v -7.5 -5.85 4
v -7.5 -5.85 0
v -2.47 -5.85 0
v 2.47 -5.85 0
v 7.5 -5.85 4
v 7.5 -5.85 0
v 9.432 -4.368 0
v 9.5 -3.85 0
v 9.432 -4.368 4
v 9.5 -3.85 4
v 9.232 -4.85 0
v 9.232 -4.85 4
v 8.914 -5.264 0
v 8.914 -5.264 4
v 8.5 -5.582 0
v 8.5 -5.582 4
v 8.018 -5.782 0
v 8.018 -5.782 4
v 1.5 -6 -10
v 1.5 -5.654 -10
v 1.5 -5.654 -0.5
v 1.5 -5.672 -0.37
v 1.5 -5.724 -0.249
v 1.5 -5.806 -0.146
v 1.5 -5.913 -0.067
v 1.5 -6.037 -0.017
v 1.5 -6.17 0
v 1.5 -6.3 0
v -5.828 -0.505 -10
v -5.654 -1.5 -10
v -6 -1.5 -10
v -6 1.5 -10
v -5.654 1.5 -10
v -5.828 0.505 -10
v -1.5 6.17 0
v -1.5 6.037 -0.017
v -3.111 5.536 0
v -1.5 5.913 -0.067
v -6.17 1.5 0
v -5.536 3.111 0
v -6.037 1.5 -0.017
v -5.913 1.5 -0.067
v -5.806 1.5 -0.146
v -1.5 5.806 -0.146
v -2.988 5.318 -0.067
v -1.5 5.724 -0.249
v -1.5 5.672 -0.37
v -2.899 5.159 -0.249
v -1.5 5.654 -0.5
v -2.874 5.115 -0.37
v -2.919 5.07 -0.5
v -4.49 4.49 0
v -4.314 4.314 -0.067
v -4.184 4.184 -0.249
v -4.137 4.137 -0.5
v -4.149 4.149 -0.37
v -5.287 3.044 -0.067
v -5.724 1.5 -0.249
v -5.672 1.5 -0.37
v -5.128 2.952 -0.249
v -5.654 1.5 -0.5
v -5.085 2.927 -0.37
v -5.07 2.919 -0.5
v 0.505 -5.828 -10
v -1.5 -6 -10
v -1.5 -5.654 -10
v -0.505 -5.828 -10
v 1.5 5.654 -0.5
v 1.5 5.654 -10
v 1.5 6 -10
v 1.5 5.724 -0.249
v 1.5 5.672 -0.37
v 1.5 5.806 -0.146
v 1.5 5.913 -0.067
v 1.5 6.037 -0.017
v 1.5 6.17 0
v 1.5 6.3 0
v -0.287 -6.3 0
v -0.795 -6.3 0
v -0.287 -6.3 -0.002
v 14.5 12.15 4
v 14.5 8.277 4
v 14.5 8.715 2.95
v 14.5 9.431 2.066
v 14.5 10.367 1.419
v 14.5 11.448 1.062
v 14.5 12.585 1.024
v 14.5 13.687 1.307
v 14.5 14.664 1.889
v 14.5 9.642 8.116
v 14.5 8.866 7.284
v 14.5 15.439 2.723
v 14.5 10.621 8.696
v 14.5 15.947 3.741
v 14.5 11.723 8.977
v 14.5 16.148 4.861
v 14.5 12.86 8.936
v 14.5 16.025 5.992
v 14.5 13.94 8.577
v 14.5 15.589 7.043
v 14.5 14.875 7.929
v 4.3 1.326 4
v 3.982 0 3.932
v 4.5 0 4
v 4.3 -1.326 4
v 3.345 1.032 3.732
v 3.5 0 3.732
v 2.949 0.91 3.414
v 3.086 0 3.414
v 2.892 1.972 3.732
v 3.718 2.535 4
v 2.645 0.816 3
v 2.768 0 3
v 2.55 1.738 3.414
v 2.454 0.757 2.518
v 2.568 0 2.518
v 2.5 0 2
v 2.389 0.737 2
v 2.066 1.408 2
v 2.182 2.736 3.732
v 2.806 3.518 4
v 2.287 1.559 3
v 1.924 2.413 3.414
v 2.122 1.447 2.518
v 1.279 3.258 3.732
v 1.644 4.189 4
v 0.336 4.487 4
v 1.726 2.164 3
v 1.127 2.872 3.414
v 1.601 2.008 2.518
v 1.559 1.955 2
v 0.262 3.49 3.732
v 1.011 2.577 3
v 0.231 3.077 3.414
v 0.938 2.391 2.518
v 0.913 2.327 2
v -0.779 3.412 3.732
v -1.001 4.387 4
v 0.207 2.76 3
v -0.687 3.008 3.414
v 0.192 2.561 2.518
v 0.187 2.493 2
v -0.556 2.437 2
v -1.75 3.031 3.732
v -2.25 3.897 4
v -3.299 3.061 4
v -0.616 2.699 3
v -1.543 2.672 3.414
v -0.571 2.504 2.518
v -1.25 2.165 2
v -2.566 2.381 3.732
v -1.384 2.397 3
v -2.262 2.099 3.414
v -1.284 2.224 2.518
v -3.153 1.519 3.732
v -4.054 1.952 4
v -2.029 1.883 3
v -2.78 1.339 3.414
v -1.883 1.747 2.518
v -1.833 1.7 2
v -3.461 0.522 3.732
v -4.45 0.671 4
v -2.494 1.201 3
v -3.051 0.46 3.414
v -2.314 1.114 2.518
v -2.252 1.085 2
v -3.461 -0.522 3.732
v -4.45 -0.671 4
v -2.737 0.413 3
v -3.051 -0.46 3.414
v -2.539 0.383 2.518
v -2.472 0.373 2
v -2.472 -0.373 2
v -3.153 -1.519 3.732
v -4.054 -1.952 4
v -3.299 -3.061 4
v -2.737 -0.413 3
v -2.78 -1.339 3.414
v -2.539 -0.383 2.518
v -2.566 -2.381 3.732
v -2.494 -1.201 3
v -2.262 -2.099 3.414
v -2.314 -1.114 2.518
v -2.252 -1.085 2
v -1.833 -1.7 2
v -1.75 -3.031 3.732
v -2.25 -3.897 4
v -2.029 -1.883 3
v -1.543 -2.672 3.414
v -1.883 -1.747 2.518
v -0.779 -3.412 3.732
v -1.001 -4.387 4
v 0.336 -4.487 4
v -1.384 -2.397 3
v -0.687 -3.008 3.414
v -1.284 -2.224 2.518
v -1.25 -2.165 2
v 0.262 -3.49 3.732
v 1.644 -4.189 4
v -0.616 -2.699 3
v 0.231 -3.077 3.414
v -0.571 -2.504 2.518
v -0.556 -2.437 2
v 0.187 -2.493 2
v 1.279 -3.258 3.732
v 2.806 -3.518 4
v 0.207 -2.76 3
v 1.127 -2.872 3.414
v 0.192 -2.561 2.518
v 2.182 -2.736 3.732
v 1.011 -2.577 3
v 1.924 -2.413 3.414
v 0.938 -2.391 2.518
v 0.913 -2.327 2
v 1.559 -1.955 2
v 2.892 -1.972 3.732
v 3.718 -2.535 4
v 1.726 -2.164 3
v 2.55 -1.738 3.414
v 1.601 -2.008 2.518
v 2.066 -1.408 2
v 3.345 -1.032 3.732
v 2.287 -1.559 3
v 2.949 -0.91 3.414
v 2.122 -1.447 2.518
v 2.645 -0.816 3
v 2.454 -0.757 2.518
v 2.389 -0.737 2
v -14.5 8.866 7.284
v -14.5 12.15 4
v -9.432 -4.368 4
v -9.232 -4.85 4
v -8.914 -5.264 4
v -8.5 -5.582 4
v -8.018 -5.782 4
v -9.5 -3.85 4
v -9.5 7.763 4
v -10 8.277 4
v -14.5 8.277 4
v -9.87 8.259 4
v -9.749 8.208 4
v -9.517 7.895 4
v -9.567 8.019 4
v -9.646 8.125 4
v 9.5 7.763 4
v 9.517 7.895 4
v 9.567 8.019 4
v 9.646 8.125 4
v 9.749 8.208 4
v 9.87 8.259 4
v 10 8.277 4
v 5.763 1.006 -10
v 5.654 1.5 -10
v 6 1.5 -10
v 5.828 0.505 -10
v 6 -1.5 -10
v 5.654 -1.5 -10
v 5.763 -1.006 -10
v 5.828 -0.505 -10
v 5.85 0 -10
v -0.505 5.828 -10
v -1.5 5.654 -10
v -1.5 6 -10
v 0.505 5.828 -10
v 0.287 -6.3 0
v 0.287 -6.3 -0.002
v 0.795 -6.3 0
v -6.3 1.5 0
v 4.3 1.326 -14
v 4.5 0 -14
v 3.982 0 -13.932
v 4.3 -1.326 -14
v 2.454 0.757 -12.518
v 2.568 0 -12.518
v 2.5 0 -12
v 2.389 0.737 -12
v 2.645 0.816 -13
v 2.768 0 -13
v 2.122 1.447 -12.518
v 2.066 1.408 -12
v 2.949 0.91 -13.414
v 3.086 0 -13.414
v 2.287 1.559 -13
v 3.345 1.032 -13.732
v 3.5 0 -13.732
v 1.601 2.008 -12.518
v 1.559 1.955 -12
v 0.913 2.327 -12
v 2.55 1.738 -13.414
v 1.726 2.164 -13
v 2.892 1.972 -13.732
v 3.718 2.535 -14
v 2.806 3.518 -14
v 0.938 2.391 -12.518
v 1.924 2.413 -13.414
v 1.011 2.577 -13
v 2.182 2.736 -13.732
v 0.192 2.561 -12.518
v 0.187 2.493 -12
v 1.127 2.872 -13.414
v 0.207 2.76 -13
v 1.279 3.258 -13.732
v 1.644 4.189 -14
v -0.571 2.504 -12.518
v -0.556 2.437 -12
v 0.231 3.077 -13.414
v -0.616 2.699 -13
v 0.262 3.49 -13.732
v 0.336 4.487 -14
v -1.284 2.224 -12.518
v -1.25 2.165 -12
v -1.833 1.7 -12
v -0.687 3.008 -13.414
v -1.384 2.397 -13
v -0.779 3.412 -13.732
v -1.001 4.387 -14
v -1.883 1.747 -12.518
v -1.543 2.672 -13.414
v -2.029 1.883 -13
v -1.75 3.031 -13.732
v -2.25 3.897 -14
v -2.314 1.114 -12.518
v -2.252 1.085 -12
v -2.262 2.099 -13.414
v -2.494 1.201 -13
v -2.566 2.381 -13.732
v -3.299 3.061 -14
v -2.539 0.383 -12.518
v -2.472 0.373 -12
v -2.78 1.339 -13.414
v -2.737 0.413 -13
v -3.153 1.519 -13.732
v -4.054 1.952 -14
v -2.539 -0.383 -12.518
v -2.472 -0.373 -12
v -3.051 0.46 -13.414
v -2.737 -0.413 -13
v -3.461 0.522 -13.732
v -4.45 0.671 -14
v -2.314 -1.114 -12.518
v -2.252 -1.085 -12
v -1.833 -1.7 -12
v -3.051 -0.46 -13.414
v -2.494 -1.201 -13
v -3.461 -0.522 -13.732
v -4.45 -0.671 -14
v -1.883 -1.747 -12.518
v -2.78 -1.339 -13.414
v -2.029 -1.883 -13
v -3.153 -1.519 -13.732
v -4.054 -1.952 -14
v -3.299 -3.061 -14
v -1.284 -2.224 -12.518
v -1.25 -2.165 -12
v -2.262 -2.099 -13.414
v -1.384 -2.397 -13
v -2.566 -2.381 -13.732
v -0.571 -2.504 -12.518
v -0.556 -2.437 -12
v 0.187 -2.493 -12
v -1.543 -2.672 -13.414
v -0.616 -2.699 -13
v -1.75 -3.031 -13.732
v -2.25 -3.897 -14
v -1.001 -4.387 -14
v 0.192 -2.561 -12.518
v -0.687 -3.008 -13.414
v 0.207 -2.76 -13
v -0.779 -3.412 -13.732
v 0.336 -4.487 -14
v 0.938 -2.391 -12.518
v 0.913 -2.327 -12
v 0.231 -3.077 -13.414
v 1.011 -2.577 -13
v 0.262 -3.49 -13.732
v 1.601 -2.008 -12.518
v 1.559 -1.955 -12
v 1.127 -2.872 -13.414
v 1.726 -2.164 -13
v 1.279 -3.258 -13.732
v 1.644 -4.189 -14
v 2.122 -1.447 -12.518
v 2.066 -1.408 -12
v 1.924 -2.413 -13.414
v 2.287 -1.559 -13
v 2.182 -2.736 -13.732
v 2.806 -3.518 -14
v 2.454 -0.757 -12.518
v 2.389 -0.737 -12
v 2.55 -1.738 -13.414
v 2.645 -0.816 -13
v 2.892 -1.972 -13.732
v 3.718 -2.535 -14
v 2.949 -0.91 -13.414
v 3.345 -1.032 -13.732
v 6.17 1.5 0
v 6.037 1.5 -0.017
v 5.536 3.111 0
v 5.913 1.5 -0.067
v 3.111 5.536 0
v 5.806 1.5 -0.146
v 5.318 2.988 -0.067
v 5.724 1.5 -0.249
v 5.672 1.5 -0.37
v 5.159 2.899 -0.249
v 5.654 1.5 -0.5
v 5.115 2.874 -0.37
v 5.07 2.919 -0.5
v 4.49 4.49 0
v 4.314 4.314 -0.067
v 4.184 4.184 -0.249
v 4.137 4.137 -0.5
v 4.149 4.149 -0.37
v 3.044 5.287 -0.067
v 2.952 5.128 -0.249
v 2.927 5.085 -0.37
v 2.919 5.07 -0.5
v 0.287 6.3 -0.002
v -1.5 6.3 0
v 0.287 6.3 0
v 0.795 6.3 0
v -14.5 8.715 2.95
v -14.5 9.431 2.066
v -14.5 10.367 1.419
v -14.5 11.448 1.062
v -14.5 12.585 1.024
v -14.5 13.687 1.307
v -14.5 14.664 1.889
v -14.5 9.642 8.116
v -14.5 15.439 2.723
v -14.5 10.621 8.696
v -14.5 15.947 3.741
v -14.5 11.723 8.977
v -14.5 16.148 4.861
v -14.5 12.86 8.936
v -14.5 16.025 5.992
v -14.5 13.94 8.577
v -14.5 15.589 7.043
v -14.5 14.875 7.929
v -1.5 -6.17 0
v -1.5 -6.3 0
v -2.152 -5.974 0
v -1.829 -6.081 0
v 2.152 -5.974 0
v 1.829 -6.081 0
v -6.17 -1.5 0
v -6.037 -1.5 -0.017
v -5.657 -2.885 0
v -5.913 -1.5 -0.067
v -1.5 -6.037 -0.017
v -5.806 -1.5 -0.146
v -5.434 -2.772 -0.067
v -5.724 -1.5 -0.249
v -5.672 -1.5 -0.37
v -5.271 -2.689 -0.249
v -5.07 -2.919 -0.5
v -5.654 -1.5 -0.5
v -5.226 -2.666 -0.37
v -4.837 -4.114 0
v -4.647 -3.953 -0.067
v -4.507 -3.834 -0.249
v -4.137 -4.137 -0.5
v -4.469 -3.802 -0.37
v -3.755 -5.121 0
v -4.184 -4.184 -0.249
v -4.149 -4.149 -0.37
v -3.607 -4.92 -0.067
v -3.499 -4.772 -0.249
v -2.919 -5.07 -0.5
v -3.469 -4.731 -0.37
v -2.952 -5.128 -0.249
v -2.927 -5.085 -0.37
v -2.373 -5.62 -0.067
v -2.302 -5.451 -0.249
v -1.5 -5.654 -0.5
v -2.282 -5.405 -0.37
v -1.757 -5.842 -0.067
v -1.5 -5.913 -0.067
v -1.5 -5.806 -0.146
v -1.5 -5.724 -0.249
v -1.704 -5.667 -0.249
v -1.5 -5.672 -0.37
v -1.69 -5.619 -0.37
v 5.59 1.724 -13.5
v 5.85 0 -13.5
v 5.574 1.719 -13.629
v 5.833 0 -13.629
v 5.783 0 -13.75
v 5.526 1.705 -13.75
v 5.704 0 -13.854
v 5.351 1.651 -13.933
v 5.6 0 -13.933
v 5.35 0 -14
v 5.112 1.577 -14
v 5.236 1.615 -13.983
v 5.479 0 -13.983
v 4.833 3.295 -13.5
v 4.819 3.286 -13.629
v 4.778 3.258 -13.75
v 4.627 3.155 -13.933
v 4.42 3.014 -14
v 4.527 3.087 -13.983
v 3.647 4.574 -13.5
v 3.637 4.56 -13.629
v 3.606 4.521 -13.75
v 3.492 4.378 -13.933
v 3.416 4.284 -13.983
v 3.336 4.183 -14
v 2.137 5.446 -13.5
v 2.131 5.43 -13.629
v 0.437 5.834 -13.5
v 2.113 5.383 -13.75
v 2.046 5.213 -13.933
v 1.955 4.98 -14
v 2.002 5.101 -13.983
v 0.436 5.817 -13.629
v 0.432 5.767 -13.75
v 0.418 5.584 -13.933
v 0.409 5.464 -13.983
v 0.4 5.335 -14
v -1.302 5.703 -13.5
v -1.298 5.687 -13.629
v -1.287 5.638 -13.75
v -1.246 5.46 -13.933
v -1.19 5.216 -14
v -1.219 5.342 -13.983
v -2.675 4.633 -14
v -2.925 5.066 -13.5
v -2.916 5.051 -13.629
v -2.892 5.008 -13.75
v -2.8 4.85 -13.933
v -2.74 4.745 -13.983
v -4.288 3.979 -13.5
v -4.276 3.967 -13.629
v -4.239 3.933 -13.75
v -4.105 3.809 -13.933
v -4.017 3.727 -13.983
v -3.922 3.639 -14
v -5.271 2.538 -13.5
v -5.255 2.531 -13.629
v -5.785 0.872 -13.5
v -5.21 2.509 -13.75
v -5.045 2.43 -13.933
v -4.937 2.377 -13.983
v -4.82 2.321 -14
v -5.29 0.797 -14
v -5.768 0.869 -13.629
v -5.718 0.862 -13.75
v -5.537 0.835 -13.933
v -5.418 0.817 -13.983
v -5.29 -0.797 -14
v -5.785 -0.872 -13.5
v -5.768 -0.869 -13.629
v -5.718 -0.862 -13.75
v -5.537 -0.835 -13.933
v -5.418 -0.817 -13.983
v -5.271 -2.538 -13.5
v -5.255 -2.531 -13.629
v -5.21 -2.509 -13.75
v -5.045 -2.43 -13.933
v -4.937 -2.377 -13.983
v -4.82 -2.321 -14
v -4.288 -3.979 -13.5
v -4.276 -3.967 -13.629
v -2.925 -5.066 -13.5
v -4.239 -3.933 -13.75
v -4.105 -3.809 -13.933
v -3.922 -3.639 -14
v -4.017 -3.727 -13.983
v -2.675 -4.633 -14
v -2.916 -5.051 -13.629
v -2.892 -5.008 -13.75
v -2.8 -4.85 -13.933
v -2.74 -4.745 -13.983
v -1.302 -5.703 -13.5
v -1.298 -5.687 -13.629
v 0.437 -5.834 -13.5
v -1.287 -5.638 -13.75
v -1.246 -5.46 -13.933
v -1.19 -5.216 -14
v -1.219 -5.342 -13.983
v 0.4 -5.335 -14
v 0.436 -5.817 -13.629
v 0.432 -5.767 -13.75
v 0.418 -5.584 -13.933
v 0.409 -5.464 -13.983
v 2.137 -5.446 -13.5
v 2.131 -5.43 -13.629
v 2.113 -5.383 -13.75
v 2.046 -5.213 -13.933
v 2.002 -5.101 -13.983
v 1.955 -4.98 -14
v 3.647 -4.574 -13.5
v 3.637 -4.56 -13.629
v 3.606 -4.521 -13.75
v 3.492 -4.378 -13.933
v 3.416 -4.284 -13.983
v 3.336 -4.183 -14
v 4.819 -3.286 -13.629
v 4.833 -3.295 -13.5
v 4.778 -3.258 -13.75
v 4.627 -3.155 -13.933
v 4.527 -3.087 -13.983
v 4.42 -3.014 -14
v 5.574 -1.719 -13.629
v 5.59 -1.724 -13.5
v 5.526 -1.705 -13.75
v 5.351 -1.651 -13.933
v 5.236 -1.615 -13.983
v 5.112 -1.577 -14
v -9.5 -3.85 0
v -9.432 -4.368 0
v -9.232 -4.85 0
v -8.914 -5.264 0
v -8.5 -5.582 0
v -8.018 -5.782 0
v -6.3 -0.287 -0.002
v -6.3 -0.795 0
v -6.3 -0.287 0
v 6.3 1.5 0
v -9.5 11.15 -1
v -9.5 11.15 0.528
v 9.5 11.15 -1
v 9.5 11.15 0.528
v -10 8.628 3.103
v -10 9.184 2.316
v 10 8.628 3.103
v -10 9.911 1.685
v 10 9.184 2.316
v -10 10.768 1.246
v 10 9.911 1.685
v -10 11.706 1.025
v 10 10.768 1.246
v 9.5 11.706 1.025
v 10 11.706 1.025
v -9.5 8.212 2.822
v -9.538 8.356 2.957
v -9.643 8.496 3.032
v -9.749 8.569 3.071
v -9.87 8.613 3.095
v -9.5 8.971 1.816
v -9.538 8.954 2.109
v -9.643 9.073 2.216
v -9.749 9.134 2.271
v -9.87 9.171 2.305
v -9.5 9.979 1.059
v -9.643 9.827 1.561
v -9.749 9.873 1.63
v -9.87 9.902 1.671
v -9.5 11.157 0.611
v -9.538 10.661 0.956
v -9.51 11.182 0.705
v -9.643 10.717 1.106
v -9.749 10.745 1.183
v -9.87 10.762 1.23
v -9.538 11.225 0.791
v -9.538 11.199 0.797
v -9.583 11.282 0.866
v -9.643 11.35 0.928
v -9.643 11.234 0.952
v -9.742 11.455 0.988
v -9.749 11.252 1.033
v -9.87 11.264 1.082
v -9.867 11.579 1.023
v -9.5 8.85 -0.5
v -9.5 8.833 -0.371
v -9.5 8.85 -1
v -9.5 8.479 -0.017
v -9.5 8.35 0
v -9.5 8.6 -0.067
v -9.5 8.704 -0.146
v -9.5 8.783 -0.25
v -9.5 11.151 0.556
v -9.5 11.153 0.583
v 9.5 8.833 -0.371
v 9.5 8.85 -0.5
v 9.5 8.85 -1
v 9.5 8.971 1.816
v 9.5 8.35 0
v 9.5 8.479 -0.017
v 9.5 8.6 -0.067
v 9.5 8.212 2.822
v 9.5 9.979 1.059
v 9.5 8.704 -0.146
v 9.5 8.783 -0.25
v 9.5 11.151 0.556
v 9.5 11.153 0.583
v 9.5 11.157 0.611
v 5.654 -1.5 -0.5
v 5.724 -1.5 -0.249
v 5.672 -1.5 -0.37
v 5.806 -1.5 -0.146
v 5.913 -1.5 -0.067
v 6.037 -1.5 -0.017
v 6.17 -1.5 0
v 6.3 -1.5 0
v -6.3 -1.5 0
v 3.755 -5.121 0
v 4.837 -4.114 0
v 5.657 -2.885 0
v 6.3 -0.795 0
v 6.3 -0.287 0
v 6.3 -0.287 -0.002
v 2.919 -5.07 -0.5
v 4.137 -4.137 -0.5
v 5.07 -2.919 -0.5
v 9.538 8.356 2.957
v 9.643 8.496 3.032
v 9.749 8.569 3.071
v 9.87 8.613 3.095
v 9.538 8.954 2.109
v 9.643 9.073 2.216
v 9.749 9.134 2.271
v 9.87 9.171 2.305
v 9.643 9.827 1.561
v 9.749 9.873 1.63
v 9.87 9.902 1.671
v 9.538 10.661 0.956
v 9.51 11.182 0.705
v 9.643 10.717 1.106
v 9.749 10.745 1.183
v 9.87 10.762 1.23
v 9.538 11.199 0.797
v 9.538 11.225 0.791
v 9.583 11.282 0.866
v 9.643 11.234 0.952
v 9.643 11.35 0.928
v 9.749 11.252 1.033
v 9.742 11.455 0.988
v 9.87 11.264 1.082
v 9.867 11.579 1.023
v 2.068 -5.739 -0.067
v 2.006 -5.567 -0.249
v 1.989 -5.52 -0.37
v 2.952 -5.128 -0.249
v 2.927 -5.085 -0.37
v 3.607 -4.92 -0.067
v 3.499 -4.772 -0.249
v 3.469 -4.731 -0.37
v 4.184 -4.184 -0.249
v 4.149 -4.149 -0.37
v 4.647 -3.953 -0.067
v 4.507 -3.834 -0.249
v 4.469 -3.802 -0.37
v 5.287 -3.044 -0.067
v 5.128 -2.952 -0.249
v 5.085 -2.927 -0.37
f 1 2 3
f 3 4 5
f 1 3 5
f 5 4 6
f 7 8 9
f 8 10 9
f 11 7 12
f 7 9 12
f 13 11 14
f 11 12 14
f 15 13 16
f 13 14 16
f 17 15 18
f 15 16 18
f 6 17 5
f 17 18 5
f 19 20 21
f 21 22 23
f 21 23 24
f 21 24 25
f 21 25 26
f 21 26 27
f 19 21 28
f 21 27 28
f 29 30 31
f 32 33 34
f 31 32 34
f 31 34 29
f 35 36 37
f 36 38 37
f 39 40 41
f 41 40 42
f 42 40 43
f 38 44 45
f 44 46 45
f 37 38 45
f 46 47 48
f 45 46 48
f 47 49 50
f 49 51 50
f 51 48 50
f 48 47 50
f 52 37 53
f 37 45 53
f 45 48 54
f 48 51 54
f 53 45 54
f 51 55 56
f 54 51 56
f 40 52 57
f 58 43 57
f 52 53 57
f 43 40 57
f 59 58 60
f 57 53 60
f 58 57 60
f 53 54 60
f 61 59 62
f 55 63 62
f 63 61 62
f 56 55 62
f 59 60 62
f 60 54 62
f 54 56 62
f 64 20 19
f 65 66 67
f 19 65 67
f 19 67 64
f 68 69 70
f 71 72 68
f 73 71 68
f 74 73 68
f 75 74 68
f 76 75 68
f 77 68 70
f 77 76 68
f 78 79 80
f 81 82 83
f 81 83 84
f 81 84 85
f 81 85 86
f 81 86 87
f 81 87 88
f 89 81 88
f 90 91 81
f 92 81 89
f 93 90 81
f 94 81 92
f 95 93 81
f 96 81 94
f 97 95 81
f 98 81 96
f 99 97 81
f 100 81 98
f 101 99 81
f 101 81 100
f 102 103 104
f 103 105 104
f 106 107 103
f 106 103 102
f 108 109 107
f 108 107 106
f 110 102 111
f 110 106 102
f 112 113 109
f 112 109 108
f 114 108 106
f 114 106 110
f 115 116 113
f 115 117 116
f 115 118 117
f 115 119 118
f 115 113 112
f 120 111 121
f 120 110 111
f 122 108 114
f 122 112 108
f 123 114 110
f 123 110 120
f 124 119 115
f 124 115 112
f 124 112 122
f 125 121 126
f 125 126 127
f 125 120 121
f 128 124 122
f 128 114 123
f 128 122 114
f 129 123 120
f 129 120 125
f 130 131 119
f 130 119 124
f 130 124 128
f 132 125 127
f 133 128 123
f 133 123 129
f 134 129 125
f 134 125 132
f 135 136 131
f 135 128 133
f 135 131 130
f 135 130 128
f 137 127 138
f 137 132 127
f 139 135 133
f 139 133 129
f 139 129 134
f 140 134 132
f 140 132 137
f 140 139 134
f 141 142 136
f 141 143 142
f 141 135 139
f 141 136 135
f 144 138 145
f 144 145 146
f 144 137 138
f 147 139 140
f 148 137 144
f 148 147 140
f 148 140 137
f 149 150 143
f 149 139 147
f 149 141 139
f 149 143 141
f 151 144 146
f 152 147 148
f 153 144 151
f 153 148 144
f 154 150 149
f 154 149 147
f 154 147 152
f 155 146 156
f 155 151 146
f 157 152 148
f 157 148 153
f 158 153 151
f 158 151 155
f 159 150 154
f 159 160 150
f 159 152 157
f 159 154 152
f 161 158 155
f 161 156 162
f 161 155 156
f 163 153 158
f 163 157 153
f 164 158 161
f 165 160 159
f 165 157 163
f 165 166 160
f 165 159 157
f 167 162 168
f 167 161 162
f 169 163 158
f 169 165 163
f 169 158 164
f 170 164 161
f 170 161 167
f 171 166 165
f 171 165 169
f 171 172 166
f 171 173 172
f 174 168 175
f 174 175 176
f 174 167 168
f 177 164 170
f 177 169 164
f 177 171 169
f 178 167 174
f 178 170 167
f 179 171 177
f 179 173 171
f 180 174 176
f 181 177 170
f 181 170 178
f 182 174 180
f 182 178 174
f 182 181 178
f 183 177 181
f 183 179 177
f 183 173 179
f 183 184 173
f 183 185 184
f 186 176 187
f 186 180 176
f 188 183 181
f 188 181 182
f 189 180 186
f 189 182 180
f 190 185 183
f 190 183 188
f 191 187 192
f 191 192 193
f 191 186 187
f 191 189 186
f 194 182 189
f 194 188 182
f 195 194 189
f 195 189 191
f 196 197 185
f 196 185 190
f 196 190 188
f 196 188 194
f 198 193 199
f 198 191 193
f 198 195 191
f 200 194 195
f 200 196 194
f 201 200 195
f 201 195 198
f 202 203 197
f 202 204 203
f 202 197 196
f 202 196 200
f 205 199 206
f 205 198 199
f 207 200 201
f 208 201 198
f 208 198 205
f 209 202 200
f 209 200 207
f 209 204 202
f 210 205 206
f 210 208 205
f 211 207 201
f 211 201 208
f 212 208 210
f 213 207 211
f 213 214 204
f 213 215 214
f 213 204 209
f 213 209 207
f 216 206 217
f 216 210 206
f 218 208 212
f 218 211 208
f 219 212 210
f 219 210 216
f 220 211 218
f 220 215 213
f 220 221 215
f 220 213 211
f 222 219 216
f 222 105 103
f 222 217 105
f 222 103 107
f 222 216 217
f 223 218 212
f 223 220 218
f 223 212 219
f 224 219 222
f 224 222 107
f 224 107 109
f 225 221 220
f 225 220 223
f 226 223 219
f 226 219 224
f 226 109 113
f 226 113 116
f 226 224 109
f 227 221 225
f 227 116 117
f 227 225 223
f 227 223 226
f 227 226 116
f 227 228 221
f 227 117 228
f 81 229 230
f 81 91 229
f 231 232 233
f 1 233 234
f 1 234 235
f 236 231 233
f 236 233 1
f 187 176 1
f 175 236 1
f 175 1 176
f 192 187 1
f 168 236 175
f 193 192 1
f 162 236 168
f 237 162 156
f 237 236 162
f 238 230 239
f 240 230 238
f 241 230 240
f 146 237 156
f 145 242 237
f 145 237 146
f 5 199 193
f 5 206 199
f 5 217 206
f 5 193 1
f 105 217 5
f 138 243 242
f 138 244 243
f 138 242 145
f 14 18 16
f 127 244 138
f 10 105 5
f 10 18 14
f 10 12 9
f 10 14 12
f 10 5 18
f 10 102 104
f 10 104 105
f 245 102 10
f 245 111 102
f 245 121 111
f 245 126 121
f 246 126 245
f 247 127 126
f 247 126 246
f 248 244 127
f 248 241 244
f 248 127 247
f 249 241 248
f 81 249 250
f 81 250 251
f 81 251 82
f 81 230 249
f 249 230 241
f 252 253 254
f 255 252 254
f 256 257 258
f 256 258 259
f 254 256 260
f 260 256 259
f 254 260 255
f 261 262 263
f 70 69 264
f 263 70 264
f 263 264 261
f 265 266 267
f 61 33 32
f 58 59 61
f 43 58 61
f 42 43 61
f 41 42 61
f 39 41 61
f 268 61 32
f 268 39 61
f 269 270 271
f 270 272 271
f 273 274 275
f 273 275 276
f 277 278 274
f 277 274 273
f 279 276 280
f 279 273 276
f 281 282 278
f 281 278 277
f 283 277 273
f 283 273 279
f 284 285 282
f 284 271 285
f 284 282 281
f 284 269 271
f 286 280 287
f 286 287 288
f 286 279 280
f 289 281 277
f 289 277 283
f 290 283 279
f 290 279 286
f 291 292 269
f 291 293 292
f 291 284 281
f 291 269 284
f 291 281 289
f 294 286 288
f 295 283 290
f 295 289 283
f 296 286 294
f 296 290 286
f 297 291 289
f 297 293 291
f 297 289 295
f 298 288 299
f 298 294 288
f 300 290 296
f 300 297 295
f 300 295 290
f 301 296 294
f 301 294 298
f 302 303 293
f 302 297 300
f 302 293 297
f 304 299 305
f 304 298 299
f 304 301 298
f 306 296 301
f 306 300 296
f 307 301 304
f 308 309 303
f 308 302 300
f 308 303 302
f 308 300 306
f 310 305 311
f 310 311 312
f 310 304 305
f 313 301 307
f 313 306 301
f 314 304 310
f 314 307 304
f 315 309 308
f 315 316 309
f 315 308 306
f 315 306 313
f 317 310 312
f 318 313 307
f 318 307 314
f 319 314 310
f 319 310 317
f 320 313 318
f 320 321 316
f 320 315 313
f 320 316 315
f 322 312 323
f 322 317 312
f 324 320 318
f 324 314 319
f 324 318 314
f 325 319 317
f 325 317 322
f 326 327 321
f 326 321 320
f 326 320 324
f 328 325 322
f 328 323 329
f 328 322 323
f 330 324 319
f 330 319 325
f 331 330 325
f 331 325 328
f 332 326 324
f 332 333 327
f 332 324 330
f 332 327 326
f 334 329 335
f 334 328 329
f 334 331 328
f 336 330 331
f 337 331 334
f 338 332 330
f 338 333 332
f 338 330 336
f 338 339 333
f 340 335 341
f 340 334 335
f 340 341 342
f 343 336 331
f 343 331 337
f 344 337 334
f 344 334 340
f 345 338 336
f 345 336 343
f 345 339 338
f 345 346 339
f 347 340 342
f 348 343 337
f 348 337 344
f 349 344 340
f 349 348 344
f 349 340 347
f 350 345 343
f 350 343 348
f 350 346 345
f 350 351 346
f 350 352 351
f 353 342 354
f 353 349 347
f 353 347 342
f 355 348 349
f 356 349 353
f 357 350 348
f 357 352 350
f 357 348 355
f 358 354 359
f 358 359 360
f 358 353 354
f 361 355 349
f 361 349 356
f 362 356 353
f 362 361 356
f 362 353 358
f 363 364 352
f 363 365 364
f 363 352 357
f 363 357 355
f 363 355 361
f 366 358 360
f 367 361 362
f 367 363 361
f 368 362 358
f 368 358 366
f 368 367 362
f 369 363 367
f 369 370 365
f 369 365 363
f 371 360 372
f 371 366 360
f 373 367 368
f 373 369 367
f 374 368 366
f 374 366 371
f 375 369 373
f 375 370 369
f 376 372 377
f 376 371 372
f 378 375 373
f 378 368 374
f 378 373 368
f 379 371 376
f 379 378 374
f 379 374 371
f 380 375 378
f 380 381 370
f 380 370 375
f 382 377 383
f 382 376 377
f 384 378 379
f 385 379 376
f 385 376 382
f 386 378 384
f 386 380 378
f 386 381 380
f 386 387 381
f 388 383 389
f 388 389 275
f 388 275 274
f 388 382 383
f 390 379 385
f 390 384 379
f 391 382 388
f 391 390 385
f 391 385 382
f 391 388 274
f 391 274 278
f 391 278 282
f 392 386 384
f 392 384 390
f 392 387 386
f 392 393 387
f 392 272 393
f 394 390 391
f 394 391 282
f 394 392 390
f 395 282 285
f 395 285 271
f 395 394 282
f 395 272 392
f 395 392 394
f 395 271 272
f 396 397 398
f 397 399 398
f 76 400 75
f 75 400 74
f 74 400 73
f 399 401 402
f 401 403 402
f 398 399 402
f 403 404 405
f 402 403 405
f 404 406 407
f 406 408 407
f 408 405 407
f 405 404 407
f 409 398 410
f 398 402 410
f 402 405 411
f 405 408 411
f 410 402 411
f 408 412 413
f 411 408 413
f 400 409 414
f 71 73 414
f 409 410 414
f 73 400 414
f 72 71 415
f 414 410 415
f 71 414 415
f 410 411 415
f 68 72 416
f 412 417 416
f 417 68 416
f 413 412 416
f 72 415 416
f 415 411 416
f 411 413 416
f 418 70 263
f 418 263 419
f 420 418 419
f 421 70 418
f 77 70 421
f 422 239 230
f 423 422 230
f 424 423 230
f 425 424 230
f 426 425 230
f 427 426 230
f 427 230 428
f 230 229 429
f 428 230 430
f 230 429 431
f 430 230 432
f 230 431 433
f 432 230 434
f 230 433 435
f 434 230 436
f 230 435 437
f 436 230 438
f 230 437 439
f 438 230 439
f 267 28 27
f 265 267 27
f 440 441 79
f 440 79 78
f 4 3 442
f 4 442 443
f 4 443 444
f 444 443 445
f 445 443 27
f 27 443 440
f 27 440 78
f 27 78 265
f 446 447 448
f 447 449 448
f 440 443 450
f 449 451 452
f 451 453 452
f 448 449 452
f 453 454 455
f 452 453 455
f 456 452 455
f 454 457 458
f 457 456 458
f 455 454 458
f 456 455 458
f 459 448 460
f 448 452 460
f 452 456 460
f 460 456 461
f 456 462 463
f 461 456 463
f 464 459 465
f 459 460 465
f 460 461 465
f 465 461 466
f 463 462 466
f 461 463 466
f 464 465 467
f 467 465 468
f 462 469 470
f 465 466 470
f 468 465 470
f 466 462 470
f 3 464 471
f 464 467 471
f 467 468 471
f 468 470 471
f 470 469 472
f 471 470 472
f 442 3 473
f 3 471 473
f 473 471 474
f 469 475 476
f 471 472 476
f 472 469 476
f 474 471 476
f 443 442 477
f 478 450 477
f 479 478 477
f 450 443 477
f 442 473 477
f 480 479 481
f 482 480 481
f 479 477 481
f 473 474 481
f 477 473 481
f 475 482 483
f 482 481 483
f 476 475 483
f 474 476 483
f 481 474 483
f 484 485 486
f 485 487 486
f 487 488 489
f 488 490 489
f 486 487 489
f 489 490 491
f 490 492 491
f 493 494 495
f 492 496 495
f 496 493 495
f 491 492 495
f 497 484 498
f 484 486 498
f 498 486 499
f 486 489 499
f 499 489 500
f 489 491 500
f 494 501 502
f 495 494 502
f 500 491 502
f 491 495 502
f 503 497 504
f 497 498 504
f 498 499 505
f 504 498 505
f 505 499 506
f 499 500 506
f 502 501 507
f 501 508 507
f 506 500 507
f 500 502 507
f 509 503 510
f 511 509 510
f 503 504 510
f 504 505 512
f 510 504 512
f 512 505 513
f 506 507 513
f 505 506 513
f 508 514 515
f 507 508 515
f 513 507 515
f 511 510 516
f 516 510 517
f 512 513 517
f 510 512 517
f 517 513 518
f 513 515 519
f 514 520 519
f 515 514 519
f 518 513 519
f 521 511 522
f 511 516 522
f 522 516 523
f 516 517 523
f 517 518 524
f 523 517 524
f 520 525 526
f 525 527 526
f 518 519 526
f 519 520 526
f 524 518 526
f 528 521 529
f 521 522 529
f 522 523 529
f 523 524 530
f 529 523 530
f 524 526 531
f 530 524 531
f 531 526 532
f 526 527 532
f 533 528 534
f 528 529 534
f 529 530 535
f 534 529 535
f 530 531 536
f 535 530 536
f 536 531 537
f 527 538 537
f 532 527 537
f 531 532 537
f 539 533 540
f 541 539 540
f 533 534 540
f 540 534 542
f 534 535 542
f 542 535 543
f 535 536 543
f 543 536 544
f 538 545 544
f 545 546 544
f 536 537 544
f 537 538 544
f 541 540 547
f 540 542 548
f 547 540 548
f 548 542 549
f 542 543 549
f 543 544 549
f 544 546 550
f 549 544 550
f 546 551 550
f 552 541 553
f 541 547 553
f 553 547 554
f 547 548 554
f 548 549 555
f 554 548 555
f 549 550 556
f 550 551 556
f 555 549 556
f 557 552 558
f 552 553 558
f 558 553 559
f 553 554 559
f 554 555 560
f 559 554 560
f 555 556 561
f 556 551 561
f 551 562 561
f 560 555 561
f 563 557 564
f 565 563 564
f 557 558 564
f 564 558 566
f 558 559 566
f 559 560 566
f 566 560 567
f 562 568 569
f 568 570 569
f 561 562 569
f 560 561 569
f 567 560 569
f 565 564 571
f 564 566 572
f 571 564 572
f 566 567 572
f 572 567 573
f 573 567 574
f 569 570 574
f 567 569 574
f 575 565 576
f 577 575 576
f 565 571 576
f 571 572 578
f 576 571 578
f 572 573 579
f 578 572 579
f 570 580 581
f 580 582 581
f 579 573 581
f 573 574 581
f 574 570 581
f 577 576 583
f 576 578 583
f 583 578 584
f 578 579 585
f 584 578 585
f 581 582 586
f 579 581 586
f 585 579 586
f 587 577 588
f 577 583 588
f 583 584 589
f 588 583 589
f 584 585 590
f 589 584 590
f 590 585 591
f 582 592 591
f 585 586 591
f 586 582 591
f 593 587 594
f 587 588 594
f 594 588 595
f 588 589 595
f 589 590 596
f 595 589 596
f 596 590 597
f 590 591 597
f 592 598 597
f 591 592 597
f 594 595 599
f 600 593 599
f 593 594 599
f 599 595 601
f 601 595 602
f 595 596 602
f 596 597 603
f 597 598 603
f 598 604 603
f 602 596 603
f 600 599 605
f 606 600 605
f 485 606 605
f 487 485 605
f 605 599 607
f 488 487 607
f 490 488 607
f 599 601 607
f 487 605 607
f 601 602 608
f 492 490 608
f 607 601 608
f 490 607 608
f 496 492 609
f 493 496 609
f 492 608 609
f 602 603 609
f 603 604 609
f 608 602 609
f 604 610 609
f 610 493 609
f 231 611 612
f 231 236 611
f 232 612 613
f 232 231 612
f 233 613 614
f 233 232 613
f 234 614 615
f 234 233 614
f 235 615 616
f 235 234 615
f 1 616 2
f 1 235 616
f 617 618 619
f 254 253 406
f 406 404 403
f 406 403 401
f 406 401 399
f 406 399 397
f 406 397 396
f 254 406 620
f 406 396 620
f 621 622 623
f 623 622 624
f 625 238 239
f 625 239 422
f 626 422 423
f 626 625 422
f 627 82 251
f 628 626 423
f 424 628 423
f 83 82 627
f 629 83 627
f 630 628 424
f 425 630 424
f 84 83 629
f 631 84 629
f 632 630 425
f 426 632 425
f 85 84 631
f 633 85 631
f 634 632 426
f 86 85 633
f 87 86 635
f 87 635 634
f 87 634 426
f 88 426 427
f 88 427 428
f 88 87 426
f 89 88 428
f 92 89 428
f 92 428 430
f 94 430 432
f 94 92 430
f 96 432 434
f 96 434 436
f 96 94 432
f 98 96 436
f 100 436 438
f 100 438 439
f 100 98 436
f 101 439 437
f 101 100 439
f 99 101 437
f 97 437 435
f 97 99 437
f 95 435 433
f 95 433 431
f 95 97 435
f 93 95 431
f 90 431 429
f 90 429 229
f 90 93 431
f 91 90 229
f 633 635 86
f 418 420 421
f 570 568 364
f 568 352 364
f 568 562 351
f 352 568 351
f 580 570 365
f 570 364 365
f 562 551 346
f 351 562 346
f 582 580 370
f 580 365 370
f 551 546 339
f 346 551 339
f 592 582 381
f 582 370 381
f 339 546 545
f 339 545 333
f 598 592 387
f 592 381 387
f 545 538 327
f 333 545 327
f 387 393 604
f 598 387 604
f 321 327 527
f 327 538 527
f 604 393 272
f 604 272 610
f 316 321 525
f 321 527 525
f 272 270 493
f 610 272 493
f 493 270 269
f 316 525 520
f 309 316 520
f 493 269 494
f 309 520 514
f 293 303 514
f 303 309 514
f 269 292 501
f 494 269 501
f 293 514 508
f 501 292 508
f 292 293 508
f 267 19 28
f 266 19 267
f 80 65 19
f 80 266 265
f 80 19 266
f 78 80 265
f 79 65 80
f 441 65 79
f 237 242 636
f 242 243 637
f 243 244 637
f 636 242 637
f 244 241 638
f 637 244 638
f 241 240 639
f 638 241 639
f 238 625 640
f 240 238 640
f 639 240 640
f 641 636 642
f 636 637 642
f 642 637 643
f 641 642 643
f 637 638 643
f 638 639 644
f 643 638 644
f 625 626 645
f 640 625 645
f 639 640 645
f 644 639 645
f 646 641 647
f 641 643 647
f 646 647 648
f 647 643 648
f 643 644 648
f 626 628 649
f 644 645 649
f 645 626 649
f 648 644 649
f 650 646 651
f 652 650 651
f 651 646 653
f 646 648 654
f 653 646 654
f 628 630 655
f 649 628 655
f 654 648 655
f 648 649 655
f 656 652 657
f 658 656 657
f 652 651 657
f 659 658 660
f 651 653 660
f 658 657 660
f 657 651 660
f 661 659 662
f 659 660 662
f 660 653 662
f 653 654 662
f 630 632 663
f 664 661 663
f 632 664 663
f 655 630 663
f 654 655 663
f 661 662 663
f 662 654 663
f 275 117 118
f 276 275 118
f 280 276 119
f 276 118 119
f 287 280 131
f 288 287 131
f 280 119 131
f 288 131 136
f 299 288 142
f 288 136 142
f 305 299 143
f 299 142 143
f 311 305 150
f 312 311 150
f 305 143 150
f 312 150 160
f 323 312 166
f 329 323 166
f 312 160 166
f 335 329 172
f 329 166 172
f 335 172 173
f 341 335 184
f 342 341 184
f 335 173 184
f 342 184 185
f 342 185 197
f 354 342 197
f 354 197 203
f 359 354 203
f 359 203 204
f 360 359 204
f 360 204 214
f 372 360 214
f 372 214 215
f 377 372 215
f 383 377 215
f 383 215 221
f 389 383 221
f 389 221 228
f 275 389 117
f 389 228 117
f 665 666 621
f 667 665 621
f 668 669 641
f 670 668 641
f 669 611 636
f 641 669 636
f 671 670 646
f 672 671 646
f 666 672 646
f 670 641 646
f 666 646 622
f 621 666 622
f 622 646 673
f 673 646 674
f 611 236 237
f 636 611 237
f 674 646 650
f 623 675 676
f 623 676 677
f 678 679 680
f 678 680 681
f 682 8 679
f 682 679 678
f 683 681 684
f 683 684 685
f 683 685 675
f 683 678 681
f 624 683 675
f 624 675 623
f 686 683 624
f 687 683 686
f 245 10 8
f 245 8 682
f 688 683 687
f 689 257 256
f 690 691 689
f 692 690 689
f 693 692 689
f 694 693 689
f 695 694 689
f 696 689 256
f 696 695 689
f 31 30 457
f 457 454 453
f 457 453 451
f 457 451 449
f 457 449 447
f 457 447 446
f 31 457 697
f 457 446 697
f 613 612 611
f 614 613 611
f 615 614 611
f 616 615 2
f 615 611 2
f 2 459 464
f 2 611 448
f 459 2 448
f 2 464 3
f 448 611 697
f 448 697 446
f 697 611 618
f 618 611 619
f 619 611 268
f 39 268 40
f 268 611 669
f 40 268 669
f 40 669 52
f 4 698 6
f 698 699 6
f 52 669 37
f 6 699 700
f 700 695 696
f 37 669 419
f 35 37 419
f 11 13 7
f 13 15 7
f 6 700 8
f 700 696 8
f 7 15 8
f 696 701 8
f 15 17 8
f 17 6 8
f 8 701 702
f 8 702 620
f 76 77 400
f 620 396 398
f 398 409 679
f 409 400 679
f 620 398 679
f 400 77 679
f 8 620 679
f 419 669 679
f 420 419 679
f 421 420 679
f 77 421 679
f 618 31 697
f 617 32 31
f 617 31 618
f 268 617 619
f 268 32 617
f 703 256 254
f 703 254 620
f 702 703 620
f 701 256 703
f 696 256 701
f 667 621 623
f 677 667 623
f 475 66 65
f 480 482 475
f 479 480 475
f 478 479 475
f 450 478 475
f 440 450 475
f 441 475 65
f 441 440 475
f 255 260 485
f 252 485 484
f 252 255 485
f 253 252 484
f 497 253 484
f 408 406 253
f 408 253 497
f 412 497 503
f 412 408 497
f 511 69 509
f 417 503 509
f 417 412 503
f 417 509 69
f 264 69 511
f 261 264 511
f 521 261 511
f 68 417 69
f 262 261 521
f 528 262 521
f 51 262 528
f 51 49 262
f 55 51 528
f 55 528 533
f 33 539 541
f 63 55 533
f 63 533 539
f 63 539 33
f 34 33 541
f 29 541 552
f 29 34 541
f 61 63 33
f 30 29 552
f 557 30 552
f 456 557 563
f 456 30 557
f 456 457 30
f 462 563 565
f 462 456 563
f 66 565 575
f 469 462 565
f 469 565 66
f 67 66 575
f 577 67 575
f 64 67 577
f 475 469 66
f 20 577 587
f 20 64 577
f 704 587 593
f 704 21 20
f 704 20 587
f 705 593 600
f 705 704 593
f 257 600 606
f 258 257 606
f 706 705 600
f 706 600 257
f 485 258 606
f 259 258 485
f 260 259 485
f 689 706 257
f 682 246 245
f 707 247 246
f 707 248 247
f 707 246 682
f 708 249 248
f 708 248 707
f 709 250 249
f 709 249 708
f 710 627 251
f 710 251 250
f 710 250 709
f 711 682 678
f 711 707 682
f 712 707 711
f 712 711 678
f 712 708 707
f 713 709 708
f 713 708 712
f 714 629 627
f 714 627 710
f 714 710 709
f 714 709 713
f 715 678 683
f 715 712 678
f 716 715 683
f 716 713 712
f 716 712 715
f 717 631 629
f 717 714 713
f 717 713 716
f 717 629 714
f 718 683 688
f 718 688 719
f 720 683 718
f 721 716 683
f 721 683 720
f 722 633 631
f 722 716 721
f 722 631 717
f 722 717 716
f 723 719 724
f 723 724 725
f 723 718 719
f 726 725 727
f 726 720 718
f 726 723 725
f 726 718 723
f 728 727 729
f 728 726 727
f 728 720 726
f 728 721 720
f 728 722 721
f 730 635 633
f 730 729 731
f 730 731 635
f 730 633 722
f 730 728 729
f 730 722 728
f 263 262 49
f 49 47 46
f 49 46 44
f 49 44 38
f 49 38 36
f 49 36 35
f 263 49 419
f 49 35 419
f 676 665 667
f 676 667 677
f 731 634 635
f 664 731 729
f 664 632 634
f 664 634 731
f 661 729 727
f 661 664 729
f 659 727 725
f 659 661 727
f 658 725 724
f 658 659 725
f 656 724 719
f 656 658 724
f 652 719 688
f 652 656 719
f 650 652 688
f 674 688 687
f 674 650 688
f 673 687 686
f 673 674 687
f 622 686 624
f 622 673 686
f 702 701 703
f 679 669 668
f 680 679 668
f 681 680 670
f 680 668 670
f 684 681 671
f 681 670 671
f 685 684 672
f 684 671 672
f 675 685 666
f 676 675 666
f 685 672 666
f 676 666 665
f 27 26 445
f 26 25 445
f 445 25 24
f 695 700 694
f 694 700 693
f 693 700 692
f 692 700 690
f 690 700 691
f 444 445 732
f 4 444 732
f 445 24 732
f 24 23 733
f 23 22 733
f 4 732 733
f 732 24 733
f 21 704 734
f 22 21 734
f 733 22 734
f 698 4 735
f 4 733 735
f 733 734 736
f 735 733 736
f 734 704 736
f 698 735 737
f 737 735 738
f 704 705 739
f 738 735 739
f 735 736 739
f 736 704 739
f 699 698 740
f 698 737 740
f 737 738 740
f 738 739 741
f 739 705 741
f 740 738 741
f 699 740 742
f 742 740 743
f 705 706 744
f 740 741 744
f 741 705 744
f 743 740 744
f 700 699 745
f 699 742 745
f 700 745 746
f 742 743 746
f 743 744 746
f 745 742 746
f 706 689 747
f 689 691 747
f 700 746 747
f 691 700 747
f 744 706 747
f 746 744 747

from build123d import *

# Parameters (mm, degrees)
F0_R            = 5.85
F1_DEPTH        = 14
F2_W            = 19
F2_H            = 17
F3_DEPTH        = 4
F4_W            = 19
F4_H            = 2.3
F5_DEPTH        = 1
F7_DEPTH        = 1.5
F7_COPIES_COUNT = 4
F9_DEPTH        = 14.5
F10_R           = 2.5
F11_DEPTH       = 15
F12_R           = 2
F13_T1_DEPTH    = 19
F13_T6_ANGLE    = 84.7754573572
F13_T12_ANGLE   = 84.7754573572
F13_T18_ANGLE   = 84.7754573572
F13_T24_ANGLE   = 84.7754573572
F13_T30_ANGLE   = 96.86145484
F13_T36_ANGLE   = 96.86145484
F13_T43_ANGLE   = 96.86145484
F13_T47_DEPTH   = 20.497881522
F13_T54_ANGLE   = 96.86145484
F13_T58_DEPTH   = 20.497881522


# Not quite as in the source:
# - a fillet or chamfer that OpenCascade refuses, or shapes differently, is made with other operations: its cross-section is extruded or revolved along the edge and cut away or added
# - a pattern or mirror of a feature is missing from the dataset's text; its kind, count and spacing are read off the source's solid


with BuildPart() as f1:
    # F0 (on Top) → F1 (new body)
    with BuildSketch(Plane.XY):
        Circle(F0_R)
    extrude(amount=-F1_DEPTH)

    # F2 (on Top) → F3 (join)
    with BuildSketch(Plane.XY):
        with Locations((0, 2.65)):
            Rectangle(F2_W, F2_H)
    extrude(amount=F3_DEPTH)

    # F4 (on Top) → F5 (join)
    with BuildSketch(Plane.XY):
        with Locations((0, 10)):
            Rectangle(F4_W, F4_H)
    extrude(amount=-F5_DEPTH)

    # F6 (on Front) → F7 (join, symmetric)
    with BuildSketch(Plane.XZ):
        Polygon((6, -10), (6.3, 0), (5, 0), (5, -10), align=None)
    f7 = extrude(amount=F7_DEPTH, both=True)

    # F7_copies: F7 ×4 about axis
    f7_copies_axis = Axis((0, 0, 0), (0, 0, 1))
    for i in range(1, F7_COPIES_COUNT):
        add(f7.rotate(f7_copies_axis, i * 360 / F7_COPIES_COUNT))

    # F8 (on Right) → F9 (join, symmetric)
    with BuildSketch(Plane.YZ):
        with BuildLine():
            Line((12.15, 4), (8.2770166538, 4))
            ThreePointArc((8.2770166538, 4), (16.0871501864, 4.2937079857), (8.8661178186, 7.2838821814))
            Line((8.8661178186, 7.2838821814), (12.15, 4))
        make_face()
    extrude(amount=F9_DEPTH, both=True)

    # F10 (on Top) → F11 (cut, symmetric)
    with BuildSketch(Plane.XY):
        Circle(F10_R)
    extrude(amount=F11_DEPTH, both=True, mode=Mode.SUBTRACT)

    # F12
    f12_edges = [f1.edges().sort_by_distance(p)[0] for p in [
        (-9.5, -5.85, 2),
        (9.5, -5.85, 2),
        (-2.5, 0, -14),
        (-2.5, 0, 4),
    ]]
    fillet(f12_edges, radius=F12_R)

    # F13: fillet of radius 0.5 on 9 edges, made by hand

    # F13_s2 → F13_t1 (join)
    with BuildSketch(Plane.YZ.offset(-9.5)):
        with BuildLine():
            ThreePointArc((8.35, 0), (8.7035533906, -0.1464466094), (8.85, -0.5))
            Line((8.85, -0.5), (8.85, 0))
            Line((8.85, 0), (8.35, 0))
        make_face()
        with BuildLine():
            ThreePointArc((11.7055555556, 1.02476804), (11.3166666667, 0.9005420413), (11.15, 0.527864045))
            Line((11.15, 0.527864045), (11.15, 1.1270166538))
            ThreePointArc((11.15, 1.1270166538), (11.4259705579, 1.0660730349), (11.7055555556, 1.02476804))
        make_face()
    extrude(amount=F13_T1_DEPTH)


with BuildPart() as f13_tool4:
    # F13_s5 → F13_t6 (revolve)
    with BuildSketch(Plane(origin=(0, 0, 0), x_dir=(0, 0, 1), z_dir=(-0.9989608313, -0.0455769416, 0))):
        with BuildLine():
            ThreePointArc((0, -6.35), (-0.1464466094, -5.9964466094), (-0.5, -5.85))
            Line((-0.5, -5.85), (0, -5.85))
            Line((0, -5.85), (0, -6.35))
        make_face()
    revolve(axis=Axis((0, 0, 0), (0, 0, 1)), revolution_arc=F13_T6_ANGLE)

    split(bisect_by=Plane(origin=(6.2943350984, 0, -0.188830053), x_dir=(0, 1, 0), z_dir=(-0.9995503035, 0, 0.0299865091)), keep=Keep.TOP)

    split(bisect_by=Plane(origin=(0, -6.2943350984, -0.188830053), x_dir=(1, 0, 0), z_dir=(0, 0.9995503035, 0.0299865091)), keep=Keep.TOP)


with BuildPart() as f1_1:
    add(f1.part)

    # F13_t3: union F13_tool4
    add(f13_tool4.part)


with BuildPart() as f13_tool10:
    # F13_s11 → F13_t12 (revolve)
    with BuildSketch(Plane(origin=(0, 0, 0), x_dir=(0, 0, 1), z_dir=(0.0455769416, -0.9989608313, 0))):
        with BuildLine():
            ThreePointArc((0, -6.35), (-0.1464466094, -5.9964466094), (-0.5, -5.85))
            Line((-0.5, -5.85), (0, -5.85))
            Line((0, -5.85), (0, -6.35))
        make_face()
    revolve(axis=Axis((0, 0, 0), (0, 0, 1)), revolution_arc=F13_T12_ANGLE)

    split(bisect_by=Plane.XZ.offset(-1.5), keep=Keep.BOTTOM)

    split(bisect_by=Plane(origin=(0, 6.2943350984, -0.188830053), x_dir=(1, 0, 0), z_dir=(0, -0.9995503035, 0.0299865091)), keep=Keep.TOP)


with BuildPart() as f1_2:
    add(f1_1.part)

    # F13_t9: union F13_tool10
    add(f13_tool10.part)


with BuildPart() as f13_tool16:
    # F13_s17 → F13_t18 (revolve)
    with BuildSketch(Plane(origin=(0, 0, 0), x_dir=(0, 0, 1), z_dir=(0.9989608313, 0.0455769416, 0))):
        with BuildLine():
            ThreePointArc((0, -6.35), (-0.1464466094, -5.9964466094), (-0.5, -5.85))
            Line((-0.5, -5.85), (0, -5.85))
            Line((0, -5.85), (0, -6.35))
        make_face()
    revolve(axis=Axis((0, 0, 0), (0, 0, 1)), revolution_arc=F13_T18_ANGLE)

    split(bisect_by=Plane.XZ.offset(-1.5), keep=Keep.BOTTOM)

    split(bisect_by=Plane.YZ.offset(-1.5), keep=Keep.BOTTOM)


with BuildPart() as f1_3:
    add(f1_2.part)

    # F13_t15: union F13_tool16
    add(f13_tool16.part)


with BuildPart() as f13_tool22:
    # F13_s23 → F13_t24 (revolve)
    with BuildSketch(Plane(origin=(0, 0, 0), x_dir=(0, 0, 1), z_dir=(-0.0455769416, 0.9989608313, 0))):
        with BuildLine():
            ThreePointArc((0, -6.35), (-0.1464466094, -5.9964466094), (-0.5, -5.85))
            Line((-0.5, -5.85), (0, -5.85))
            Line((0, -5.85), (0, -6.35))
        make_face()
    revolve(axis=Axis((0, 0, 0), (0, 0, 1)), revolution_arc=F13_T24_ANGLE)

    split(bisect_by=Plane(origin=(-6.2943350984, 0, -0.188830053), x_dir=(0, 1, 0), z_dir=(0.9995503035, 0, 0.0299865091)), keep=Keep.TOP)

    split(bisect_by=Plane(origin=(0, -6.2943350984, -0.188830053), x_dir=(1, 0, 0), z_dir=(0, 0.9995503035, 0.0299865091)), keep=Keep.TOP)


with BuildPart() as f1_4:
    add(f1_3.part)

    # F13_t21: union F13_tool22
    add(f13_tool22.part)


with BuildPart() as f13_tool28:
    # F13_s29 → F13_t30 (revolve)
    with BuildSketch(Plane(origin=(0, 0.3421818863, 5.7078686812), x_dir=(1, 0, 0), z_dir=(0, 0.0598417157, 0.9982078787))):
        with BuildLine():
            ThreePointArc((-9.5, 7.3290171475), (-9.6464466094, 7.6825705381), (-10, 7.8290171475))
            Line((-10, 7.8290171475), (-9.5, 7.8290171475))
            Line((-9.5, 7.8290171475), (-9.5, 7.3290171475))
        make_face()
    revolve(axis=Axis((-9.5, 12.15, 5), (1, 0, 0)), revolution_arc=F13_T30_ANGLE)

    split(bisect_by=Plane.XY.offset(4), keep=Keep.BOTTOM)

    split(bisect_by=Plane.XZ.offset(-11.15), keep=Keep.TOP)


with BuildPart() as f1_5:
    add(f1_4.part)

    # F13_t27: union F13_tool28
    add(f13_tool28.part)


with BuildPart() as f13_tool34:
    # F13_s35 → F13_t36 (revolve)
    with BuildSketch(Plane(origin=(0, 0.3421818863, 5.7078686812), x_dir=(1, 0, 0), z_dir=(0, 0.0598417157, 0.9982078787))):
        with BuildLine():
            ThreePointArc((9.5, 7.3290171475), (9.6464466094, 7.6825705381), (10, 7.8290171475))
            Line((10, 7.8290171475), (9.5, 7.8290171475))
            Line((9.5, 7.8290171475), (9.5, 7.3290171475))
        make_face()
    revolve(axis=Axis((9.5, 12.15, 5), (1, 0, 0)), revolution_arc=F13_T36_ANGLE)

    split(bisect_by=Plane.XY.offset(4), keep=Keep.BOTTOM)

    split(bisect_by=Plane.XZ.offset(-11.15), keep=Keep.TOP)


with BuildPart() as f1_6:
    add(f1_5.part)

    # F13_t33: union F13_tool34
    add(f13_tool34.part)


with BuildPart() as f13_tool41:
    # F13_s42 → F13_t43 (revolve)
    with BuildSketch(Plane(origin=(0, 0.3421818863, 5.7078686812), x_dir=(1, 0, 0), z_dir=(0, 0.0598417157, 0.9982078787))):
        with BuildLine():
            ThreePointArc((-9.5, 7.3290171475), (-9.6464466094, 7.6825705381), (-10, 7.8290171475))
            Line((-10, 7.8290171475), (-9.5, 7.8290171475))
            Line((-9.5, 7.8290171475), (-9.5, 7.3290171475))
        make_face()
    revolve(axis=Axis((-9.5, 12.15, 5), (1, 0, 0)), revolution_arc=F13_T43_ANGLE)

    split(bisect_by=Plane.XZ.offset(-11.15), keep=Keep.BOTTOM)


with BuildPart() as f13_tool45:
    # F13_s46 → F13_t47 (new body)
    with BuildSketch(Plane.YZ.offset(-10.997881522)):
        with BuildLine():
            ThreePointArc((11.7055555556, 1.02476804), (11.3166666667, 0.9005420413), (11.15, 0.527864045))
            Line((11.15, 0.527864045), (11.15, 1.1270166538))
            ThreePointArc((11.15, 1.1270166538), (11.4259705579, 1.0660730349), (11.7055555556, 1.02476804))
        make_face()
    extrude(amount=F13_T47_DEPTH)

    split(bisect_by=Plane.YZ.offset(-9.5), keep=Keep.BOTTOM)


with BuildPart() as f13_tool41_1:
    add(f13_tool41.part)

    # F13_t49: intersect F13_tool45
    add(f13_tool45.part, mode=Mode.INTERSECT)


with BuildPart() as f1_7:
    add(f1_6.part)

    # F13_t39: union F13_tool41
    add(f13_tool41_1.part)


with BuildPart() as f13_tool52:
    # F13_s53 → F13_t54 (revolve)
    with BuildSketch(Plane(origin=(0, 0.3421818863, 5.7078686812), x_dir=(1, 0, 0), z_dir=(0, 0.0598417157, 0.9982078787))):
        with BuildLine():
            ThreePointArc((9.5, 7.3290171475), (9.6464466094, 7.6825705381), (10, 7.8290171475))
            Line((10, 7.8290171475), (9.5, 7.8290171475))
            Line((9.5, 7.8290171475), (9.5, 7.3290171475))
        make_face()
    revolve(axis=Axis((9.5, 12.15, 5), (1, 0, 0)), revolution_arc=F13_T54_ANGLE)

    split(bisect_by=Plane.XZ.offset(-11.15), keep=Keep.BOTTOM)


with BuildPart() as f13_tool56:
    # F13_s57 → F13_t58 (new body)
    with BuildSketch(Plane.YZ.offset(-9.5)):
        with BuildLine():
            ThreePointArc((11.7055555556, 1.02476804), (11.3166666667, 0.9005420413), (11.15, 0.527864045))
            Line((11.15, 0.527864045), (11.15, 1.1270166538))
            ThreePointArc((11.15, 1.1270166538), (11.4259705579, 1.0660730349), (11.7055555556, 1.02476804))
        make_face()
    extrude(amount=F13_T58_DEPTH)

    split(bisect_by=Plane.YZ.offset(9.5), keep=Keep.TOP)


with BuildPart() as f13_tool52_1:
    add(f13_tool52.part)

    # F13_t60: intersect F13_tool56
    add(f13_tool56.part, mode=Mode.INTERSECT)


with BuildPart() as f1_8:
    add(f1_7.part)

    # F13_t50: union F13_tool52
    add(f13_tool52_1.part)

    # F13_s61 → F13_t62 (revolve, cut)
    with BuildSketch(Plane.XZ):
        with BuildLine():
            ThreePointArc((5.85, -13.5), (5.7035533906, -13.8535533906), (5.35, -14))
            Line((5.35, -14), (5.85, -14))
            Line((5.85, -14), (5.85, -13.5))
        make_face()
    revolve(axis=Axis((0, 0, -14), (0, 0, 1)), mode=Mode.SUBTRACT)


solid = f1_8.part
